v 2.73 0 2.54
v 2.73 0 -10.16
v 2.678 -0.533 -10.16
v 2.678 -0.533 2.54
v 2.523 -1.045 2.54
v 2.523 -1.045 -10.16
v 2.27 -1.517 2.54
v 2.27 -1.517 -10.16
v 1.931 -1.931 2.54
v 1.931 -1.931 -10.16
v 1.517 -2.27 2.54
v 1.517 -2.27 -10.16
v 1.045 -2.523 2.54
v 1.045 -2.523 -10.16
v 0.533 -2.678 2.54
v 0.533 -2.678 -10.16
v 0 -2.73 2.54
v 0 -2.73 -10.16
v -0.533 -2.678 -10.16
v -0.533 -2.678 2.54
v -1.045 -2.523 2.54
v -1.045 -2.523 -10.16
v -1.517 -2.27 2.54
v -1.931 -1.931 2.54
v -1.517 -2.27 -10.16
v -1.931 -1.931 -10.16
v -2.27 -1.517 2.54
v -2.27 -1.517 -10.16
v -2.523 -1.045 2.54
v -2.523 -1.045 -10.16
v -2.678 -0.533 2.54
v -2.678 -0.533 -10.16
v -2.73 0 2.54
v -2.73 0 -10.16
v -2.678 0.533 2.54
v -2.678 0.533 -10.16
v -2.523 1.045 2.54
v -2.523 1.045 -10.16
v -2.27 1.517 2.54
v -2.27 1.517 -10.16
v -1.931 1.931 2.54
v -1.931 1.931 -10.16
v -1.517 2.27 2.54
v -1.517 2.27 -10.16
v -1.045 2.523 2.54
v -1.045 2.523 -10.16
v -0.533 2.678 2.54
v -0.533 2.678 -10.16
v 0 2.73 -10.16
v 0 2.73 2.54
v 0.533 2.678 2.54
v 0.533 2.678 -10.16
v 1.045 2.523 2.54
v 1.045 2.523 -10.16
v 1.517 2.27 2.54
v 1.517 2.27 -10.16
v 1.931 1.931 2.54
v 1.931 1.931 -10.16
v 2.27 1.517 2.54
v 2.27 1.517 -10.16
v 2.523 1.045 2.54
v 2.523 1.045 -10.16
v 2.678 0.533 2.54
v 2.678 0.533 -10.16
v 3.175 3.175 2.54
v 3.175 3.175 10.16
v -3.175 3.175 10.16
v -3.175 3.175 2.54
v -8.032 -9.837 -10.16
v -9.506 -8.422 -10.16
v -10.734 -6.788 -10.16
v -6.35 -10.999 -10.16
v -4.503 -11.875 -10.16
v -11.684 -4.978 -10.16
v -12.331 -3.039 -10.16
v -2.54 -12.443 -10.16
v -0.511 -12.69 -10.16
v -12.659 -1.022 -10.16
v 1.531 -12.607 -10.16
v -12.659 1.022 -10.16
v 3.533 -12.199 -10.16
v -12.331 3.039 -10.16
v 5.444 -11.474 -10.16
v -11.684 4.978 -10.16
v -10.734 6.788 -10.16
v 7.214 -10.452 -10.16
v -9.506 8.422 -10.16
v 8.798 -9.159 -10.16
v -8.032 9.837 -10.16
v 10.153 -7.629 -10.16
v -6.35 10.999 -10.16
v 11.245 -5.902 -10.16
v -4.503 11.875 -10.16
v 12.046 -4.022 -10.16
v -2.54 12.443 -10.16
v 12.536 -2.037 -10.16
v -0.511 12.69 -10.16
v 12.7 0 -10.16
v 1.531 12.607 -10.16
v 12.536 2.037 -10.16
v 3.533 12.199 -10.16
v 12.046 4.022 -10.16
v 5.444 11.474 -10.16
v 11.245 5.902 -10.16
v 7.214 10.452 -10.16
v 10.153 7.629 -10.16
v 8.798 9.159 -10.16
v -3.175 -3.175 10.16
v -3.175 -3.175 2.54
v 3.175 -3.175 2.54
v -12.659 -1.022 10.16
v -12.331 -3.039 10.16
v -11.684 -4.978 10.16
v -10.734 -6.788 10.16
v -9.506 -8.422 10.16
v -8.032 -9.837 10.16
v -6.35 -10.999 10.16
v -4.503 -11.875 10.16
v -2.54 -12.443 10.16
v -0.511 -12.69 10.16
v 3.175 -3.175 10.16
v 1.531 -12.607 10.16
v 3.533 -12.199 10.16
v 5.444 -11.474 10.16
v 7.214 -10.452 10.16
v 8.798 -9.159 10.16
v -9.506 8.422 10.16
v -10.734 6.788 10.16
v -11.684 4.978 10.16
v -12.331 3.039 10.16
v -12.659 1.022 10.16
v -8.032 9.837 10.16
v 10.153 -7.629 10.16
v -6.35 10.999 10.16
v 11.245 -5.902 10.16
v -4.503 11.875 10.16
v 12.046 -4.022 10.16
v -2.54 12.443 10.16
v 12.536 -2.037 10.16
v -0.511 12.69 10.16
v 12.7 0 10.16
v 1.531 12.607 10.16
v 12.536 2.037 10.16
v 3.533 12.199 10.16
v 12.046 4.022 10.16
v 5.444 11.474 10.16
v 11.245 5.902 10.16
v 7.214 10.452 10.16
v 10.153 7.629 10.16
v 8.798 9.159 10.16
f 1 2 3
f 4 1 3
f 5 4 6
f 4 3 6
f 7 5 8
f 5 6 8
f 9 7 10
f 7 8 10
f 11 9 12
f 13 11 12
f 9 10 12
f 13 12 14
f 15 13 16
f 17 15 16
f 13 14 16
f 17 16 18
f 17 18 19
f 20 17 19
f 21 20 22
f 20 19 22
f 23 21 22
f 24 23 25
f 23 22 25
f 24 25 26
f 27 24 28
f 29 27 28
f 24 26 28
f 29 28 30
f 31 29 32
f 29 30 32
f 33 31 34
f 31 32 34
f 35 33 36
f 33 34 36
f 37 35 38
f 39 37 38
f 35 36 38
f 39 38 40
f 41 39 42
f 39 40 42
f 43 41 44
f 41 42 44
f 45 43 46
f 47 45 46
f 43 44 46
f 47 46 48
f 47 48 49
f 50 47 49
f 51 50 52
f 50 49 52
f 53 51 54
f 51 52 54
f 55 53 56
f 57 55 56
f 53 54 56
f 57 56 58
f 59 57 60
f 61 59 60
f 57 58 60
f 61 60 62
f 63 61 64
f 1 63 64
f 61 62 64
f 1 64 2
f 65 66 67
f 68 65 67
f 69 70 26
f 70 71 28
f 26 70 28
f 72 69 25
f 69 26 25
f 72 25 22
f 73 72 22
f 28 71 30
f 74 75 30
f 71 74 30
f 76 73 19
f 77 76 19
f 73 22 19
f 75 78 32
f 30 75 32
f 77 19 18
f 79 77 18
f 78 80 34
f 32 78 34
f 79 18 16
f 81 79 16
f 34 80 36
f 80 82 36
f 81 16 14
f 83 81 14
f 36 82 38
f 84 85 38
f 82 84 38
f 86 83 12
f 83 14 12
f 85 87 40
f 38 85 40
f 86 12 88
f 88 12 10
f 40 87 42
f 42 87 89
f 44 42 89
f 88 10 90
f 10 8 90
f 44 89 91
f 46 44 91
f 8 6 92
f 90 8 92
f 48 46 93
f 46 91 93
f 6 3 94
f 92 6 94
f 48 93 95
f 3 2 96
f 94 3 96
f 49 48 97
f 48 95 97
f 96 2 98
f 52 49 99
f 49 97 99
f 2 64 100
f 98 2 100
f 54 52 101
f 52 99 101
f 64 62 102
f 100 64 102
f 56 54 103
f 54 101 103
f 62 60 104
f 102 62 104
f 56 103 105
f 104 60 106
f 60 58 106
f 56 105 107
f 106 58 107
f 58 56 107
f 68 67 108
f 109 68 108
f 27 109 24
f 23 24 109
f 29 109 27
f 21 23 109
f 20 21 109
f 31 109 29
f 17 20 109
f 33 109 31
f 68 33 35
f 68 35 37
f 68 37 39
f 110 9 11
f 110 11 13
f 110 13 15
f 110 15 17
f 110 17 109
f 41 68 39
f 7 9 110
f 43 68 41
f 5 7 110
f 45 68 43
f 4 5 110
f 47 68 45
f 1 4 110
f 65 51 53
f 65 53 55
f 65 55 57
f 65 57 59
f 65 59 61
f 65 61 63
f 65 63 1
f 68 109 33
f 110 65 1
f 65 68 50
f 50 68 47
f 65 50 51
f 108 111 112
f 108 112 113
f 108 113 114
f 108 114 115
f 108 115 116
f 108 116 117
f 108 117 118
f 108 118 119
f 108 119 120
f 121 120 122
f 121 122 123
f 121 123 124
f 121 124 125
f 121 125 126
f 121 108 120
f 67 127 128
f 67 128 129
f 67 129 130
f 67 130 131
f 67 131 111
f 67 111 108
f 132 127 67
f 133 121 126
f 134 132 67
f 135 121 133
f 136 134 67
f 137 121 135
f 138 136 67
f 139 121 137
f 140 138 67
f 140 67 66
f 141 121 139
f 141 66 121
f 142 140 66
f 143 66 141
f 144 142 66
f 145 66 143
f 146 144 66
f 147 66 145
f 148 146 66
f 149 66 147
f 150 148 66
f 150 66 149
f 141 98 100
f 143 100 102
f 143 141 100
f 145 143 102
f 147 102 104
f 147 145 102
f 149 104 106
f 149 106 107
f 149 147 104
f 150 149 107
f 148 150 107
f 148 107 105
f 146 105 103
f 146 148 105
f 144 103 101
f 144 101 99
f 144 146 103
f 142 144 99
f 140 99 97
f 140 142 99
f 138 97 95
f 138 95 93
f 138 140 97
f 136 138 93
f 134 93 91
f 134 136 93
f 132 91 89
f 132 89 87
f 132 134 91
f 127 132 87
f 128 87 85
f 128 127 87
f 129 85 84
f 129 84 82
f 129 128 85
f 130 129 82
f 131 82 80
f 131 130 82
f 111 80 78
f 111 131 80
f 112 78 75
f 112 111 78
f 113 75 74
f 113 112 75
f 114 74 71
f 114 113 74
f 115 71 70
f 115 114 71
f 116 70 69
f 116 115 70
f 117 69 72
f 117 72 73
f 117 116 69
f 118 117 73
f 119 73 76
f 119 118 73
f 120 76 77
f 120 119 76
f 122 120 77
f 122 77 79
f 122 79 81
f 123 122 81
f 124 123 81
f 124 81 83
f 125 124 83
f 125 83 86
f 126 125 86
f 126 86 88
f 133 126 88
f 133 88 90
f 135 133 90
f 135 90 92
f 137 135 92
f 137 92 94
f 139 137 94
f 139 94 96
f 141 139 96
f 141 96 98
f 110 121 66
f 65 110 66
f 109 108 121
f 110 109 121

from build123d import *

# Parameters (mm, degrees)
F0_R     = 12.7
F1_DEPTH = 10.16
F2_W     = 3.175
F2_H     = 3.175
F3_DEPTH = 7.62
F4_R     = 2.7305
F5_DEPTH = 12.7


with BuildPart() as f1:
    # F0 (on Top) → F1 (new body, symmetric)
    with BuildSketch(Plane.XY):
        Circle(F0_R)
    extrude(amount=F1_DEPTH, both=True)

    # F2 (on face) → F3 (cut, symmetric)
    with BuildSketch(Plane.XY.offset(10.16)):
        with Locations((-1.5875, 1.5875)):
            Rectangle(F2_W, F2_H)
        with Locations((1.5875, 1.5875)):
            Rectangle(F2_W, F2_H)
        with Locations((-1.5875, -1.5875)):
            Rectangle(F2_W, F2_H)
        with Locations((1.5875, -1.5875)):
            Rectangle(F2_W, F2_H)
    extrude(amount=F3_DEPTH, both=True, mode=Mode.SUBTRACT)

    # F4 (on face) → F5 (cut, symmetric)
    with BuildSketch(Plane(origin=(0, 0, -10.16), x_dir=(1, 0, 0), z_dir=(0, 0, -1))):
        Circle(F4_R)
    extrude(amount=F5_DEPTH, both=True, mode=Mode.SUBTRACT)


solid = f1.part
